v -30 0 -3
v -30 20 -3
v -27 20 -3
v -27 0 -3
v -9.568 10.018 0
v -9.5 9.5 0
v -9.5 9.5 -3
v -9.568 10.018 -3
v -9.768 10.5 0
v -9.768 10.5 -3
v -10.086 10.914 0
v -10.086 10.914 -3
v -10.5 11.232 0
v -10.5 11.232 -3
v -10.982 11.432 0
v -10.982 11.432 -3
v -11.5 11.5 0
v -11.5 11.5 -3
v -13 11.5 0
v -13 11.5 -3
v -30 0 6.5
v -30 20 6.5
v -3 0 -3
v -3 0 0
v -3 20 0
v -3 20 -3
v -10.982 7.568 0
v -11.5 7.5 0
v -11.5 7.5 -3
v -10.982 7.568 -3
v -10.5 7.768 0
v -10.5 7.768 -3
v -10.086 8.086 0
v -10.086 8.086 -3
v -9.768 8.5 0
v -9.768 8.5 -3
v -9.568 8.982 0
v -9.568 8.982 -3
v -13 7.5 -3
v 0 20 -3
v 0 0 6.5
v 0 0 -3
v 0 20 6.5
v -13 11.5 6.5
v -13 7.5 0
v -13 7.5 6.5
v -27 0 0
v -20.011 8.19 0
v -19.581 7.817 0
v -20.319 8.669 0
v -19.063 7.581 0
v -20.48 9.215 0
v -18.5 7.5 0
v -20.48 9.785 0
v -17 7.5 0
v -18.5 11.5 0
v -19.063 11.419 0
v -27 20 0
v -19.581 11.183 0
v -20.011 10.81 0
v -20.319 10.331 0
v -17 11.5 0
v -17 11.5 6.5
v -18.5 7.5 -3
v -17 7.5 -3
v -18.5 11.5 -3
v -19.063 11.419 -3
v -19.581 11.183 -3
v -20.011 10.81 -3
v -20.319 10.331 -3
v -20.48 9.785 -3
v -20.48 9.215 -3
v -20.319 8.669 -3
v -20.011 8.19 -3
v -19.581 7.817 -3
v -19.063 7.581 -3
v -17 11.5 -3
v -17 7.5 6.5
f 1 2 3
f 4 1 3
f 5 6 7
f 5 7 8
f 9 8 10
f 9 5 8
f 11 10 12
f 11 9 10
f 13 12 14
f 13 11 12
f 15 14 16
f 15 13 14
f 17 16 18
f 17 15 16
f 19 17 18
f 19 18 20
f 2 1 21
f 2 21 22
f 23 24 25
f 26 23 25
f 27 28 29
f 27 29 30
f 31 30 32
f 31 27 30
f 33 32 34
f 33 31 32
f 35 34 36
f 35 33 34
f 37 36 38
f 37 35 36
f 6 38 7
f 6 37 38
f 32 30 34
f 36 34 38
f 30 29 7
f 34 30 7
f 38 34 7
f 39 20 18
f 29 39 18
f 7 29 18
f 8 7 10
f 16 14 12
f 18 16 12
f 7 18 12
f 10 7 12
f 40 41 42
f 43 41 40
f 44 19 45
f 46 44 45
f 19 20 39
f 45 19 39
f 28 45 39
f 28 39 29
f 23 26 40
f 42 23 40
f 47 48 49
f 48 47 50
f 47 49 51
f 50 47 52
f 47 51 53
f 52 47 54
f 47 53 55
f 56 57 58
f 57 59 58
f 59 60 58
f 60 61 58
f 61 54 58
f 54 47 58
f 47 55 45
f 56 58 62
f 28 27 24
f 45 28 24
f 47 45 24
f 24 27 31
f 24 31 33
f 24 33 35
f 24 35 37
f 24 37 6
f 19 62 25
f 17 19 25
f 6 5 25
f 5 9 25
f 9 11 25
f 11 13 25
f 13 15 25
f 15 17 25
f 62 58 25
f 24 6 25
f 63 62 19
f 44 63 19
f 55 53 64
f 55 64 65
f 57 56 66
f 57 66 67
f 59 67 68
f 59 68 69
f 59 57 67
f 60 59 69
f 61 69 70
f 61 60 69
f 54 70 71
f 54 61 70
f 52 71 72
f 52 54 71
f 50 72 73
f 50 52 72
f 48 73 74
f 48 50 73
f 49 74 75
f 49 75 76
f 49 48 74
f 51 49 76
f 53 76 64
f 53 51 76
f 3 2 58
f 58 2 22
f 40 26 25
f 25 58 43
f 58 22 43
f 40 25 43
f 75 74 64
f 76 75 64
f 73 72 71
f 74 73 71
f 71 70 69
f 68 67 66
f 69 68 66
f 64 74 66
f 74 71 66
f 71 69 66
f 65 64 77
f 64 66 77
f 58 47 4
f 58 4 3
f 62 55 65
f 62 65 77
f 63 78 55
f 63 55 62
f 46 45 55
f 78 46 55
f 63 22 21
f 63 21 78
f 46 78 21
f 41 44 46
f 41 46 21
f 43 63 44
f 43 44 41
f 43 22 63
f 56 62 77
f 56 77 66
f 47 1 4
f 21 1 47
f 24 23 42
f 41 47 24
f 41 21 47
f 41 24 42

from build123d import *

# Parameters (mm, degrees)
F0_W     = 3
F0_H     = 20
F1_DEPTH = 6.5
F2_DEPTH = 3
F3_DEPTH = 3


# Not quite as in the source:
# - a feature names something its author has since deleted; it is built from what else it names


with BuildPart() as f1:
    # F0 (on Top) → F1 (new body)
    with BuildSketch(Plane.XY):
        with Locations((-1.5, 10)):
            Rectangle(F0_W, F0_H)
        Polygon((-27, 0), (-3, 0), (-3, 20), (-15, 20), (-27, 20), align=None)
        with BuildLine():
            Line((-17, 11.5), (-15, 11.5))
            Line((-15, 11.5), (-13, 11.5))
            Line((-13, 11.5), (-11.5, 11.5))
            ThreePointArc((-11.5, 11.5), (-10.0857864376, 10.9142135624), (-9.5, 9.5))
            ThreePointArc((-9.5, 9.5), (-10.0857864376, 8.0857864376), (-11.5, 7.5))
            Line((-11.5, 7.5), (-13, 7.5))
            Line((-13, 7.5), (-17, 7.5))
            Line((-17, 7.5), (-18.5, 7.5))
            ThreePointArc((-18.5, 7.5), (-20.5, 9.5), (-18.5, 11.5))
            Line((-18.5, 11.5), (-17, 11.5))
        make_face(mode=Mode.SUBTRACT)
        with Locations((-28.5, 10)):
            Rectangle(F0_W, F0_H)
        with BuildLine():
            Line((-17, 10.8228756555), (-17, 11.5))
            Line((-17, 11.5), (-18.5, 11.5))
            ThreePointArc((-18.5, 11.5), (-17.6771243445, 11.3228756555), (-17, 10.8228756555))
        make_face()
        with BuildLine():
            Line((-11.5, 11.5), (-13, 11.5))
            Line((-13, 11.5), (-13, 10.8228756555))
            ThreePointArc((-13, 10.8228756555), (-12.3228756555, 11.3228756555), (-11.5, 11.5))
        make_face()
        with BuildLine():
            ThreePointArc((-17, 10.8228756555), (-17.6771243445, 11.3228756555), (-18.5, 11.5))
            ThreePointArc((-18.5, 11.5), (-20.5, 9.5), (-18.5, 7.5))
            Line((-18.5, 7.5), (-17, 7.5))
            Line((-17, 7.5), (-17, 9.5))
            Line((-17, 9.5), (-17, 10.8228756555))
        make_face()
        with BuildLine():
            ThreePointArc((-9.5, 9.5), (-10.0857864376, 10.9142135624), (-11.5, 11.5))
            ThreePointArc((-11.5, 11.5), (-12.3228756555, 11.3228756555), (-13, 10.8228756555))
            Line((-13, 10.8228756555), (-13, 8.1771243445))
            ThreePointArc((-13, 8.1771243445), (-12.3228756555, 7.6771243445), (-11.5, 7.5))
            ThreePointArc((-11.5, 7.5), (-10.0857864376, 8.0857864376), (-9.5, 9.5))
        make_face()
        with BuildLine():
            ThreePointArc((-11.5, 7.5), (-12.3228756555, 7.6771243445), (-13, 8.1771243445))
            Line((-13, 8.1771243445), (-13, 7.5))
            Line((-13, 7.5), (-11.5, 7.5))
        make_face()
    extrude(amount=F1_DEPTH)

    # F0 (on Top) → F2 (join)
    with BuildSketch(Plane.XY):
        with Locations((-1.5, 10)):
            Rectangle(F0_W, F0_H)
        with Locations((-28.5, 10)):
            Rectangle(F0_W, F0_H)
        with BuildLine():
            Line((-17, 10.8228756555), (-17, 11.5))
            Line((-17, 11.5), (-18.5, 11.5))
            ThreePointArc((-18.5, 11.5), (-17.6771243445, 11.3228756555), (-17, 10.8228756555))
        make_face()
        with BuildLine():
            Line((-11.5, 11.5), (-13, 11.5))
            Line((-13, 11.5), (-13, 10.8228756555))
            ThreePointArc((-13, 10.8228756555), (-12.3228756555, 11.3228756555), (-11.5, 11.5))
        make_face()
        with BuildLine():
            ThreePointArc((-17, 10.8228756555), (-17.6771243445, 11.3228756555), (-18.5, 11.5))
            ThreePointArc((-18.5, 11.5), (-20.5, 9.5), (-18.5, 7.5))
            Line((-18.5, 7.5), (-17, 7.5))
            Line((-17, 7.5), (-17, 9.5))
            Line((-17, 9.5), (-17, 10.8228756555))
        make_face()
        with BuildLine():
            ThreePointArc((-9.5, 9.5), (-10.0857864376, 10.9142135624), (-11.5, 11.5))
            ThreePointArc((-11.5, 11.5), (-12.3228756555, 11.3228756555), (-13, 10.8228756555))
            Line((-13, 10.8228756555), (-13, 8.1771243445))
            ThreePointArc((-13, 8.1771243445), (-12.3228756555, 7.6771243445), (-11.5, 7.5))
            ThreePointArc((-11.5, 7.5), (-10.0857864376, 8.0857864376), (-9.5, 9.5))
        make_face()
        with BuildLine():
            ThreePointArc((-11.5, 7.5), (-12.3228756555, 7.6771243445), (-13, 8.1771243445))
            Line((-13, 8.1771243445), (-13, 7.5))
            Line((-13, 7.5), (-11.5, 7.5))
        make_face()
    extrude(amount=-F2_DEPTH)

    # F0 (on Top) → F3 (join)
    with BuildSketch(Plane.XY):
        with Locations((-28.5, 10)):
            Rectangle(F0_W, F0_H)
        with Locations((-1.5, 10)):
            Rectangle(F0_W, F0_H)
    extrude(amount=-F3_DEPTH)


solid = f1.part
